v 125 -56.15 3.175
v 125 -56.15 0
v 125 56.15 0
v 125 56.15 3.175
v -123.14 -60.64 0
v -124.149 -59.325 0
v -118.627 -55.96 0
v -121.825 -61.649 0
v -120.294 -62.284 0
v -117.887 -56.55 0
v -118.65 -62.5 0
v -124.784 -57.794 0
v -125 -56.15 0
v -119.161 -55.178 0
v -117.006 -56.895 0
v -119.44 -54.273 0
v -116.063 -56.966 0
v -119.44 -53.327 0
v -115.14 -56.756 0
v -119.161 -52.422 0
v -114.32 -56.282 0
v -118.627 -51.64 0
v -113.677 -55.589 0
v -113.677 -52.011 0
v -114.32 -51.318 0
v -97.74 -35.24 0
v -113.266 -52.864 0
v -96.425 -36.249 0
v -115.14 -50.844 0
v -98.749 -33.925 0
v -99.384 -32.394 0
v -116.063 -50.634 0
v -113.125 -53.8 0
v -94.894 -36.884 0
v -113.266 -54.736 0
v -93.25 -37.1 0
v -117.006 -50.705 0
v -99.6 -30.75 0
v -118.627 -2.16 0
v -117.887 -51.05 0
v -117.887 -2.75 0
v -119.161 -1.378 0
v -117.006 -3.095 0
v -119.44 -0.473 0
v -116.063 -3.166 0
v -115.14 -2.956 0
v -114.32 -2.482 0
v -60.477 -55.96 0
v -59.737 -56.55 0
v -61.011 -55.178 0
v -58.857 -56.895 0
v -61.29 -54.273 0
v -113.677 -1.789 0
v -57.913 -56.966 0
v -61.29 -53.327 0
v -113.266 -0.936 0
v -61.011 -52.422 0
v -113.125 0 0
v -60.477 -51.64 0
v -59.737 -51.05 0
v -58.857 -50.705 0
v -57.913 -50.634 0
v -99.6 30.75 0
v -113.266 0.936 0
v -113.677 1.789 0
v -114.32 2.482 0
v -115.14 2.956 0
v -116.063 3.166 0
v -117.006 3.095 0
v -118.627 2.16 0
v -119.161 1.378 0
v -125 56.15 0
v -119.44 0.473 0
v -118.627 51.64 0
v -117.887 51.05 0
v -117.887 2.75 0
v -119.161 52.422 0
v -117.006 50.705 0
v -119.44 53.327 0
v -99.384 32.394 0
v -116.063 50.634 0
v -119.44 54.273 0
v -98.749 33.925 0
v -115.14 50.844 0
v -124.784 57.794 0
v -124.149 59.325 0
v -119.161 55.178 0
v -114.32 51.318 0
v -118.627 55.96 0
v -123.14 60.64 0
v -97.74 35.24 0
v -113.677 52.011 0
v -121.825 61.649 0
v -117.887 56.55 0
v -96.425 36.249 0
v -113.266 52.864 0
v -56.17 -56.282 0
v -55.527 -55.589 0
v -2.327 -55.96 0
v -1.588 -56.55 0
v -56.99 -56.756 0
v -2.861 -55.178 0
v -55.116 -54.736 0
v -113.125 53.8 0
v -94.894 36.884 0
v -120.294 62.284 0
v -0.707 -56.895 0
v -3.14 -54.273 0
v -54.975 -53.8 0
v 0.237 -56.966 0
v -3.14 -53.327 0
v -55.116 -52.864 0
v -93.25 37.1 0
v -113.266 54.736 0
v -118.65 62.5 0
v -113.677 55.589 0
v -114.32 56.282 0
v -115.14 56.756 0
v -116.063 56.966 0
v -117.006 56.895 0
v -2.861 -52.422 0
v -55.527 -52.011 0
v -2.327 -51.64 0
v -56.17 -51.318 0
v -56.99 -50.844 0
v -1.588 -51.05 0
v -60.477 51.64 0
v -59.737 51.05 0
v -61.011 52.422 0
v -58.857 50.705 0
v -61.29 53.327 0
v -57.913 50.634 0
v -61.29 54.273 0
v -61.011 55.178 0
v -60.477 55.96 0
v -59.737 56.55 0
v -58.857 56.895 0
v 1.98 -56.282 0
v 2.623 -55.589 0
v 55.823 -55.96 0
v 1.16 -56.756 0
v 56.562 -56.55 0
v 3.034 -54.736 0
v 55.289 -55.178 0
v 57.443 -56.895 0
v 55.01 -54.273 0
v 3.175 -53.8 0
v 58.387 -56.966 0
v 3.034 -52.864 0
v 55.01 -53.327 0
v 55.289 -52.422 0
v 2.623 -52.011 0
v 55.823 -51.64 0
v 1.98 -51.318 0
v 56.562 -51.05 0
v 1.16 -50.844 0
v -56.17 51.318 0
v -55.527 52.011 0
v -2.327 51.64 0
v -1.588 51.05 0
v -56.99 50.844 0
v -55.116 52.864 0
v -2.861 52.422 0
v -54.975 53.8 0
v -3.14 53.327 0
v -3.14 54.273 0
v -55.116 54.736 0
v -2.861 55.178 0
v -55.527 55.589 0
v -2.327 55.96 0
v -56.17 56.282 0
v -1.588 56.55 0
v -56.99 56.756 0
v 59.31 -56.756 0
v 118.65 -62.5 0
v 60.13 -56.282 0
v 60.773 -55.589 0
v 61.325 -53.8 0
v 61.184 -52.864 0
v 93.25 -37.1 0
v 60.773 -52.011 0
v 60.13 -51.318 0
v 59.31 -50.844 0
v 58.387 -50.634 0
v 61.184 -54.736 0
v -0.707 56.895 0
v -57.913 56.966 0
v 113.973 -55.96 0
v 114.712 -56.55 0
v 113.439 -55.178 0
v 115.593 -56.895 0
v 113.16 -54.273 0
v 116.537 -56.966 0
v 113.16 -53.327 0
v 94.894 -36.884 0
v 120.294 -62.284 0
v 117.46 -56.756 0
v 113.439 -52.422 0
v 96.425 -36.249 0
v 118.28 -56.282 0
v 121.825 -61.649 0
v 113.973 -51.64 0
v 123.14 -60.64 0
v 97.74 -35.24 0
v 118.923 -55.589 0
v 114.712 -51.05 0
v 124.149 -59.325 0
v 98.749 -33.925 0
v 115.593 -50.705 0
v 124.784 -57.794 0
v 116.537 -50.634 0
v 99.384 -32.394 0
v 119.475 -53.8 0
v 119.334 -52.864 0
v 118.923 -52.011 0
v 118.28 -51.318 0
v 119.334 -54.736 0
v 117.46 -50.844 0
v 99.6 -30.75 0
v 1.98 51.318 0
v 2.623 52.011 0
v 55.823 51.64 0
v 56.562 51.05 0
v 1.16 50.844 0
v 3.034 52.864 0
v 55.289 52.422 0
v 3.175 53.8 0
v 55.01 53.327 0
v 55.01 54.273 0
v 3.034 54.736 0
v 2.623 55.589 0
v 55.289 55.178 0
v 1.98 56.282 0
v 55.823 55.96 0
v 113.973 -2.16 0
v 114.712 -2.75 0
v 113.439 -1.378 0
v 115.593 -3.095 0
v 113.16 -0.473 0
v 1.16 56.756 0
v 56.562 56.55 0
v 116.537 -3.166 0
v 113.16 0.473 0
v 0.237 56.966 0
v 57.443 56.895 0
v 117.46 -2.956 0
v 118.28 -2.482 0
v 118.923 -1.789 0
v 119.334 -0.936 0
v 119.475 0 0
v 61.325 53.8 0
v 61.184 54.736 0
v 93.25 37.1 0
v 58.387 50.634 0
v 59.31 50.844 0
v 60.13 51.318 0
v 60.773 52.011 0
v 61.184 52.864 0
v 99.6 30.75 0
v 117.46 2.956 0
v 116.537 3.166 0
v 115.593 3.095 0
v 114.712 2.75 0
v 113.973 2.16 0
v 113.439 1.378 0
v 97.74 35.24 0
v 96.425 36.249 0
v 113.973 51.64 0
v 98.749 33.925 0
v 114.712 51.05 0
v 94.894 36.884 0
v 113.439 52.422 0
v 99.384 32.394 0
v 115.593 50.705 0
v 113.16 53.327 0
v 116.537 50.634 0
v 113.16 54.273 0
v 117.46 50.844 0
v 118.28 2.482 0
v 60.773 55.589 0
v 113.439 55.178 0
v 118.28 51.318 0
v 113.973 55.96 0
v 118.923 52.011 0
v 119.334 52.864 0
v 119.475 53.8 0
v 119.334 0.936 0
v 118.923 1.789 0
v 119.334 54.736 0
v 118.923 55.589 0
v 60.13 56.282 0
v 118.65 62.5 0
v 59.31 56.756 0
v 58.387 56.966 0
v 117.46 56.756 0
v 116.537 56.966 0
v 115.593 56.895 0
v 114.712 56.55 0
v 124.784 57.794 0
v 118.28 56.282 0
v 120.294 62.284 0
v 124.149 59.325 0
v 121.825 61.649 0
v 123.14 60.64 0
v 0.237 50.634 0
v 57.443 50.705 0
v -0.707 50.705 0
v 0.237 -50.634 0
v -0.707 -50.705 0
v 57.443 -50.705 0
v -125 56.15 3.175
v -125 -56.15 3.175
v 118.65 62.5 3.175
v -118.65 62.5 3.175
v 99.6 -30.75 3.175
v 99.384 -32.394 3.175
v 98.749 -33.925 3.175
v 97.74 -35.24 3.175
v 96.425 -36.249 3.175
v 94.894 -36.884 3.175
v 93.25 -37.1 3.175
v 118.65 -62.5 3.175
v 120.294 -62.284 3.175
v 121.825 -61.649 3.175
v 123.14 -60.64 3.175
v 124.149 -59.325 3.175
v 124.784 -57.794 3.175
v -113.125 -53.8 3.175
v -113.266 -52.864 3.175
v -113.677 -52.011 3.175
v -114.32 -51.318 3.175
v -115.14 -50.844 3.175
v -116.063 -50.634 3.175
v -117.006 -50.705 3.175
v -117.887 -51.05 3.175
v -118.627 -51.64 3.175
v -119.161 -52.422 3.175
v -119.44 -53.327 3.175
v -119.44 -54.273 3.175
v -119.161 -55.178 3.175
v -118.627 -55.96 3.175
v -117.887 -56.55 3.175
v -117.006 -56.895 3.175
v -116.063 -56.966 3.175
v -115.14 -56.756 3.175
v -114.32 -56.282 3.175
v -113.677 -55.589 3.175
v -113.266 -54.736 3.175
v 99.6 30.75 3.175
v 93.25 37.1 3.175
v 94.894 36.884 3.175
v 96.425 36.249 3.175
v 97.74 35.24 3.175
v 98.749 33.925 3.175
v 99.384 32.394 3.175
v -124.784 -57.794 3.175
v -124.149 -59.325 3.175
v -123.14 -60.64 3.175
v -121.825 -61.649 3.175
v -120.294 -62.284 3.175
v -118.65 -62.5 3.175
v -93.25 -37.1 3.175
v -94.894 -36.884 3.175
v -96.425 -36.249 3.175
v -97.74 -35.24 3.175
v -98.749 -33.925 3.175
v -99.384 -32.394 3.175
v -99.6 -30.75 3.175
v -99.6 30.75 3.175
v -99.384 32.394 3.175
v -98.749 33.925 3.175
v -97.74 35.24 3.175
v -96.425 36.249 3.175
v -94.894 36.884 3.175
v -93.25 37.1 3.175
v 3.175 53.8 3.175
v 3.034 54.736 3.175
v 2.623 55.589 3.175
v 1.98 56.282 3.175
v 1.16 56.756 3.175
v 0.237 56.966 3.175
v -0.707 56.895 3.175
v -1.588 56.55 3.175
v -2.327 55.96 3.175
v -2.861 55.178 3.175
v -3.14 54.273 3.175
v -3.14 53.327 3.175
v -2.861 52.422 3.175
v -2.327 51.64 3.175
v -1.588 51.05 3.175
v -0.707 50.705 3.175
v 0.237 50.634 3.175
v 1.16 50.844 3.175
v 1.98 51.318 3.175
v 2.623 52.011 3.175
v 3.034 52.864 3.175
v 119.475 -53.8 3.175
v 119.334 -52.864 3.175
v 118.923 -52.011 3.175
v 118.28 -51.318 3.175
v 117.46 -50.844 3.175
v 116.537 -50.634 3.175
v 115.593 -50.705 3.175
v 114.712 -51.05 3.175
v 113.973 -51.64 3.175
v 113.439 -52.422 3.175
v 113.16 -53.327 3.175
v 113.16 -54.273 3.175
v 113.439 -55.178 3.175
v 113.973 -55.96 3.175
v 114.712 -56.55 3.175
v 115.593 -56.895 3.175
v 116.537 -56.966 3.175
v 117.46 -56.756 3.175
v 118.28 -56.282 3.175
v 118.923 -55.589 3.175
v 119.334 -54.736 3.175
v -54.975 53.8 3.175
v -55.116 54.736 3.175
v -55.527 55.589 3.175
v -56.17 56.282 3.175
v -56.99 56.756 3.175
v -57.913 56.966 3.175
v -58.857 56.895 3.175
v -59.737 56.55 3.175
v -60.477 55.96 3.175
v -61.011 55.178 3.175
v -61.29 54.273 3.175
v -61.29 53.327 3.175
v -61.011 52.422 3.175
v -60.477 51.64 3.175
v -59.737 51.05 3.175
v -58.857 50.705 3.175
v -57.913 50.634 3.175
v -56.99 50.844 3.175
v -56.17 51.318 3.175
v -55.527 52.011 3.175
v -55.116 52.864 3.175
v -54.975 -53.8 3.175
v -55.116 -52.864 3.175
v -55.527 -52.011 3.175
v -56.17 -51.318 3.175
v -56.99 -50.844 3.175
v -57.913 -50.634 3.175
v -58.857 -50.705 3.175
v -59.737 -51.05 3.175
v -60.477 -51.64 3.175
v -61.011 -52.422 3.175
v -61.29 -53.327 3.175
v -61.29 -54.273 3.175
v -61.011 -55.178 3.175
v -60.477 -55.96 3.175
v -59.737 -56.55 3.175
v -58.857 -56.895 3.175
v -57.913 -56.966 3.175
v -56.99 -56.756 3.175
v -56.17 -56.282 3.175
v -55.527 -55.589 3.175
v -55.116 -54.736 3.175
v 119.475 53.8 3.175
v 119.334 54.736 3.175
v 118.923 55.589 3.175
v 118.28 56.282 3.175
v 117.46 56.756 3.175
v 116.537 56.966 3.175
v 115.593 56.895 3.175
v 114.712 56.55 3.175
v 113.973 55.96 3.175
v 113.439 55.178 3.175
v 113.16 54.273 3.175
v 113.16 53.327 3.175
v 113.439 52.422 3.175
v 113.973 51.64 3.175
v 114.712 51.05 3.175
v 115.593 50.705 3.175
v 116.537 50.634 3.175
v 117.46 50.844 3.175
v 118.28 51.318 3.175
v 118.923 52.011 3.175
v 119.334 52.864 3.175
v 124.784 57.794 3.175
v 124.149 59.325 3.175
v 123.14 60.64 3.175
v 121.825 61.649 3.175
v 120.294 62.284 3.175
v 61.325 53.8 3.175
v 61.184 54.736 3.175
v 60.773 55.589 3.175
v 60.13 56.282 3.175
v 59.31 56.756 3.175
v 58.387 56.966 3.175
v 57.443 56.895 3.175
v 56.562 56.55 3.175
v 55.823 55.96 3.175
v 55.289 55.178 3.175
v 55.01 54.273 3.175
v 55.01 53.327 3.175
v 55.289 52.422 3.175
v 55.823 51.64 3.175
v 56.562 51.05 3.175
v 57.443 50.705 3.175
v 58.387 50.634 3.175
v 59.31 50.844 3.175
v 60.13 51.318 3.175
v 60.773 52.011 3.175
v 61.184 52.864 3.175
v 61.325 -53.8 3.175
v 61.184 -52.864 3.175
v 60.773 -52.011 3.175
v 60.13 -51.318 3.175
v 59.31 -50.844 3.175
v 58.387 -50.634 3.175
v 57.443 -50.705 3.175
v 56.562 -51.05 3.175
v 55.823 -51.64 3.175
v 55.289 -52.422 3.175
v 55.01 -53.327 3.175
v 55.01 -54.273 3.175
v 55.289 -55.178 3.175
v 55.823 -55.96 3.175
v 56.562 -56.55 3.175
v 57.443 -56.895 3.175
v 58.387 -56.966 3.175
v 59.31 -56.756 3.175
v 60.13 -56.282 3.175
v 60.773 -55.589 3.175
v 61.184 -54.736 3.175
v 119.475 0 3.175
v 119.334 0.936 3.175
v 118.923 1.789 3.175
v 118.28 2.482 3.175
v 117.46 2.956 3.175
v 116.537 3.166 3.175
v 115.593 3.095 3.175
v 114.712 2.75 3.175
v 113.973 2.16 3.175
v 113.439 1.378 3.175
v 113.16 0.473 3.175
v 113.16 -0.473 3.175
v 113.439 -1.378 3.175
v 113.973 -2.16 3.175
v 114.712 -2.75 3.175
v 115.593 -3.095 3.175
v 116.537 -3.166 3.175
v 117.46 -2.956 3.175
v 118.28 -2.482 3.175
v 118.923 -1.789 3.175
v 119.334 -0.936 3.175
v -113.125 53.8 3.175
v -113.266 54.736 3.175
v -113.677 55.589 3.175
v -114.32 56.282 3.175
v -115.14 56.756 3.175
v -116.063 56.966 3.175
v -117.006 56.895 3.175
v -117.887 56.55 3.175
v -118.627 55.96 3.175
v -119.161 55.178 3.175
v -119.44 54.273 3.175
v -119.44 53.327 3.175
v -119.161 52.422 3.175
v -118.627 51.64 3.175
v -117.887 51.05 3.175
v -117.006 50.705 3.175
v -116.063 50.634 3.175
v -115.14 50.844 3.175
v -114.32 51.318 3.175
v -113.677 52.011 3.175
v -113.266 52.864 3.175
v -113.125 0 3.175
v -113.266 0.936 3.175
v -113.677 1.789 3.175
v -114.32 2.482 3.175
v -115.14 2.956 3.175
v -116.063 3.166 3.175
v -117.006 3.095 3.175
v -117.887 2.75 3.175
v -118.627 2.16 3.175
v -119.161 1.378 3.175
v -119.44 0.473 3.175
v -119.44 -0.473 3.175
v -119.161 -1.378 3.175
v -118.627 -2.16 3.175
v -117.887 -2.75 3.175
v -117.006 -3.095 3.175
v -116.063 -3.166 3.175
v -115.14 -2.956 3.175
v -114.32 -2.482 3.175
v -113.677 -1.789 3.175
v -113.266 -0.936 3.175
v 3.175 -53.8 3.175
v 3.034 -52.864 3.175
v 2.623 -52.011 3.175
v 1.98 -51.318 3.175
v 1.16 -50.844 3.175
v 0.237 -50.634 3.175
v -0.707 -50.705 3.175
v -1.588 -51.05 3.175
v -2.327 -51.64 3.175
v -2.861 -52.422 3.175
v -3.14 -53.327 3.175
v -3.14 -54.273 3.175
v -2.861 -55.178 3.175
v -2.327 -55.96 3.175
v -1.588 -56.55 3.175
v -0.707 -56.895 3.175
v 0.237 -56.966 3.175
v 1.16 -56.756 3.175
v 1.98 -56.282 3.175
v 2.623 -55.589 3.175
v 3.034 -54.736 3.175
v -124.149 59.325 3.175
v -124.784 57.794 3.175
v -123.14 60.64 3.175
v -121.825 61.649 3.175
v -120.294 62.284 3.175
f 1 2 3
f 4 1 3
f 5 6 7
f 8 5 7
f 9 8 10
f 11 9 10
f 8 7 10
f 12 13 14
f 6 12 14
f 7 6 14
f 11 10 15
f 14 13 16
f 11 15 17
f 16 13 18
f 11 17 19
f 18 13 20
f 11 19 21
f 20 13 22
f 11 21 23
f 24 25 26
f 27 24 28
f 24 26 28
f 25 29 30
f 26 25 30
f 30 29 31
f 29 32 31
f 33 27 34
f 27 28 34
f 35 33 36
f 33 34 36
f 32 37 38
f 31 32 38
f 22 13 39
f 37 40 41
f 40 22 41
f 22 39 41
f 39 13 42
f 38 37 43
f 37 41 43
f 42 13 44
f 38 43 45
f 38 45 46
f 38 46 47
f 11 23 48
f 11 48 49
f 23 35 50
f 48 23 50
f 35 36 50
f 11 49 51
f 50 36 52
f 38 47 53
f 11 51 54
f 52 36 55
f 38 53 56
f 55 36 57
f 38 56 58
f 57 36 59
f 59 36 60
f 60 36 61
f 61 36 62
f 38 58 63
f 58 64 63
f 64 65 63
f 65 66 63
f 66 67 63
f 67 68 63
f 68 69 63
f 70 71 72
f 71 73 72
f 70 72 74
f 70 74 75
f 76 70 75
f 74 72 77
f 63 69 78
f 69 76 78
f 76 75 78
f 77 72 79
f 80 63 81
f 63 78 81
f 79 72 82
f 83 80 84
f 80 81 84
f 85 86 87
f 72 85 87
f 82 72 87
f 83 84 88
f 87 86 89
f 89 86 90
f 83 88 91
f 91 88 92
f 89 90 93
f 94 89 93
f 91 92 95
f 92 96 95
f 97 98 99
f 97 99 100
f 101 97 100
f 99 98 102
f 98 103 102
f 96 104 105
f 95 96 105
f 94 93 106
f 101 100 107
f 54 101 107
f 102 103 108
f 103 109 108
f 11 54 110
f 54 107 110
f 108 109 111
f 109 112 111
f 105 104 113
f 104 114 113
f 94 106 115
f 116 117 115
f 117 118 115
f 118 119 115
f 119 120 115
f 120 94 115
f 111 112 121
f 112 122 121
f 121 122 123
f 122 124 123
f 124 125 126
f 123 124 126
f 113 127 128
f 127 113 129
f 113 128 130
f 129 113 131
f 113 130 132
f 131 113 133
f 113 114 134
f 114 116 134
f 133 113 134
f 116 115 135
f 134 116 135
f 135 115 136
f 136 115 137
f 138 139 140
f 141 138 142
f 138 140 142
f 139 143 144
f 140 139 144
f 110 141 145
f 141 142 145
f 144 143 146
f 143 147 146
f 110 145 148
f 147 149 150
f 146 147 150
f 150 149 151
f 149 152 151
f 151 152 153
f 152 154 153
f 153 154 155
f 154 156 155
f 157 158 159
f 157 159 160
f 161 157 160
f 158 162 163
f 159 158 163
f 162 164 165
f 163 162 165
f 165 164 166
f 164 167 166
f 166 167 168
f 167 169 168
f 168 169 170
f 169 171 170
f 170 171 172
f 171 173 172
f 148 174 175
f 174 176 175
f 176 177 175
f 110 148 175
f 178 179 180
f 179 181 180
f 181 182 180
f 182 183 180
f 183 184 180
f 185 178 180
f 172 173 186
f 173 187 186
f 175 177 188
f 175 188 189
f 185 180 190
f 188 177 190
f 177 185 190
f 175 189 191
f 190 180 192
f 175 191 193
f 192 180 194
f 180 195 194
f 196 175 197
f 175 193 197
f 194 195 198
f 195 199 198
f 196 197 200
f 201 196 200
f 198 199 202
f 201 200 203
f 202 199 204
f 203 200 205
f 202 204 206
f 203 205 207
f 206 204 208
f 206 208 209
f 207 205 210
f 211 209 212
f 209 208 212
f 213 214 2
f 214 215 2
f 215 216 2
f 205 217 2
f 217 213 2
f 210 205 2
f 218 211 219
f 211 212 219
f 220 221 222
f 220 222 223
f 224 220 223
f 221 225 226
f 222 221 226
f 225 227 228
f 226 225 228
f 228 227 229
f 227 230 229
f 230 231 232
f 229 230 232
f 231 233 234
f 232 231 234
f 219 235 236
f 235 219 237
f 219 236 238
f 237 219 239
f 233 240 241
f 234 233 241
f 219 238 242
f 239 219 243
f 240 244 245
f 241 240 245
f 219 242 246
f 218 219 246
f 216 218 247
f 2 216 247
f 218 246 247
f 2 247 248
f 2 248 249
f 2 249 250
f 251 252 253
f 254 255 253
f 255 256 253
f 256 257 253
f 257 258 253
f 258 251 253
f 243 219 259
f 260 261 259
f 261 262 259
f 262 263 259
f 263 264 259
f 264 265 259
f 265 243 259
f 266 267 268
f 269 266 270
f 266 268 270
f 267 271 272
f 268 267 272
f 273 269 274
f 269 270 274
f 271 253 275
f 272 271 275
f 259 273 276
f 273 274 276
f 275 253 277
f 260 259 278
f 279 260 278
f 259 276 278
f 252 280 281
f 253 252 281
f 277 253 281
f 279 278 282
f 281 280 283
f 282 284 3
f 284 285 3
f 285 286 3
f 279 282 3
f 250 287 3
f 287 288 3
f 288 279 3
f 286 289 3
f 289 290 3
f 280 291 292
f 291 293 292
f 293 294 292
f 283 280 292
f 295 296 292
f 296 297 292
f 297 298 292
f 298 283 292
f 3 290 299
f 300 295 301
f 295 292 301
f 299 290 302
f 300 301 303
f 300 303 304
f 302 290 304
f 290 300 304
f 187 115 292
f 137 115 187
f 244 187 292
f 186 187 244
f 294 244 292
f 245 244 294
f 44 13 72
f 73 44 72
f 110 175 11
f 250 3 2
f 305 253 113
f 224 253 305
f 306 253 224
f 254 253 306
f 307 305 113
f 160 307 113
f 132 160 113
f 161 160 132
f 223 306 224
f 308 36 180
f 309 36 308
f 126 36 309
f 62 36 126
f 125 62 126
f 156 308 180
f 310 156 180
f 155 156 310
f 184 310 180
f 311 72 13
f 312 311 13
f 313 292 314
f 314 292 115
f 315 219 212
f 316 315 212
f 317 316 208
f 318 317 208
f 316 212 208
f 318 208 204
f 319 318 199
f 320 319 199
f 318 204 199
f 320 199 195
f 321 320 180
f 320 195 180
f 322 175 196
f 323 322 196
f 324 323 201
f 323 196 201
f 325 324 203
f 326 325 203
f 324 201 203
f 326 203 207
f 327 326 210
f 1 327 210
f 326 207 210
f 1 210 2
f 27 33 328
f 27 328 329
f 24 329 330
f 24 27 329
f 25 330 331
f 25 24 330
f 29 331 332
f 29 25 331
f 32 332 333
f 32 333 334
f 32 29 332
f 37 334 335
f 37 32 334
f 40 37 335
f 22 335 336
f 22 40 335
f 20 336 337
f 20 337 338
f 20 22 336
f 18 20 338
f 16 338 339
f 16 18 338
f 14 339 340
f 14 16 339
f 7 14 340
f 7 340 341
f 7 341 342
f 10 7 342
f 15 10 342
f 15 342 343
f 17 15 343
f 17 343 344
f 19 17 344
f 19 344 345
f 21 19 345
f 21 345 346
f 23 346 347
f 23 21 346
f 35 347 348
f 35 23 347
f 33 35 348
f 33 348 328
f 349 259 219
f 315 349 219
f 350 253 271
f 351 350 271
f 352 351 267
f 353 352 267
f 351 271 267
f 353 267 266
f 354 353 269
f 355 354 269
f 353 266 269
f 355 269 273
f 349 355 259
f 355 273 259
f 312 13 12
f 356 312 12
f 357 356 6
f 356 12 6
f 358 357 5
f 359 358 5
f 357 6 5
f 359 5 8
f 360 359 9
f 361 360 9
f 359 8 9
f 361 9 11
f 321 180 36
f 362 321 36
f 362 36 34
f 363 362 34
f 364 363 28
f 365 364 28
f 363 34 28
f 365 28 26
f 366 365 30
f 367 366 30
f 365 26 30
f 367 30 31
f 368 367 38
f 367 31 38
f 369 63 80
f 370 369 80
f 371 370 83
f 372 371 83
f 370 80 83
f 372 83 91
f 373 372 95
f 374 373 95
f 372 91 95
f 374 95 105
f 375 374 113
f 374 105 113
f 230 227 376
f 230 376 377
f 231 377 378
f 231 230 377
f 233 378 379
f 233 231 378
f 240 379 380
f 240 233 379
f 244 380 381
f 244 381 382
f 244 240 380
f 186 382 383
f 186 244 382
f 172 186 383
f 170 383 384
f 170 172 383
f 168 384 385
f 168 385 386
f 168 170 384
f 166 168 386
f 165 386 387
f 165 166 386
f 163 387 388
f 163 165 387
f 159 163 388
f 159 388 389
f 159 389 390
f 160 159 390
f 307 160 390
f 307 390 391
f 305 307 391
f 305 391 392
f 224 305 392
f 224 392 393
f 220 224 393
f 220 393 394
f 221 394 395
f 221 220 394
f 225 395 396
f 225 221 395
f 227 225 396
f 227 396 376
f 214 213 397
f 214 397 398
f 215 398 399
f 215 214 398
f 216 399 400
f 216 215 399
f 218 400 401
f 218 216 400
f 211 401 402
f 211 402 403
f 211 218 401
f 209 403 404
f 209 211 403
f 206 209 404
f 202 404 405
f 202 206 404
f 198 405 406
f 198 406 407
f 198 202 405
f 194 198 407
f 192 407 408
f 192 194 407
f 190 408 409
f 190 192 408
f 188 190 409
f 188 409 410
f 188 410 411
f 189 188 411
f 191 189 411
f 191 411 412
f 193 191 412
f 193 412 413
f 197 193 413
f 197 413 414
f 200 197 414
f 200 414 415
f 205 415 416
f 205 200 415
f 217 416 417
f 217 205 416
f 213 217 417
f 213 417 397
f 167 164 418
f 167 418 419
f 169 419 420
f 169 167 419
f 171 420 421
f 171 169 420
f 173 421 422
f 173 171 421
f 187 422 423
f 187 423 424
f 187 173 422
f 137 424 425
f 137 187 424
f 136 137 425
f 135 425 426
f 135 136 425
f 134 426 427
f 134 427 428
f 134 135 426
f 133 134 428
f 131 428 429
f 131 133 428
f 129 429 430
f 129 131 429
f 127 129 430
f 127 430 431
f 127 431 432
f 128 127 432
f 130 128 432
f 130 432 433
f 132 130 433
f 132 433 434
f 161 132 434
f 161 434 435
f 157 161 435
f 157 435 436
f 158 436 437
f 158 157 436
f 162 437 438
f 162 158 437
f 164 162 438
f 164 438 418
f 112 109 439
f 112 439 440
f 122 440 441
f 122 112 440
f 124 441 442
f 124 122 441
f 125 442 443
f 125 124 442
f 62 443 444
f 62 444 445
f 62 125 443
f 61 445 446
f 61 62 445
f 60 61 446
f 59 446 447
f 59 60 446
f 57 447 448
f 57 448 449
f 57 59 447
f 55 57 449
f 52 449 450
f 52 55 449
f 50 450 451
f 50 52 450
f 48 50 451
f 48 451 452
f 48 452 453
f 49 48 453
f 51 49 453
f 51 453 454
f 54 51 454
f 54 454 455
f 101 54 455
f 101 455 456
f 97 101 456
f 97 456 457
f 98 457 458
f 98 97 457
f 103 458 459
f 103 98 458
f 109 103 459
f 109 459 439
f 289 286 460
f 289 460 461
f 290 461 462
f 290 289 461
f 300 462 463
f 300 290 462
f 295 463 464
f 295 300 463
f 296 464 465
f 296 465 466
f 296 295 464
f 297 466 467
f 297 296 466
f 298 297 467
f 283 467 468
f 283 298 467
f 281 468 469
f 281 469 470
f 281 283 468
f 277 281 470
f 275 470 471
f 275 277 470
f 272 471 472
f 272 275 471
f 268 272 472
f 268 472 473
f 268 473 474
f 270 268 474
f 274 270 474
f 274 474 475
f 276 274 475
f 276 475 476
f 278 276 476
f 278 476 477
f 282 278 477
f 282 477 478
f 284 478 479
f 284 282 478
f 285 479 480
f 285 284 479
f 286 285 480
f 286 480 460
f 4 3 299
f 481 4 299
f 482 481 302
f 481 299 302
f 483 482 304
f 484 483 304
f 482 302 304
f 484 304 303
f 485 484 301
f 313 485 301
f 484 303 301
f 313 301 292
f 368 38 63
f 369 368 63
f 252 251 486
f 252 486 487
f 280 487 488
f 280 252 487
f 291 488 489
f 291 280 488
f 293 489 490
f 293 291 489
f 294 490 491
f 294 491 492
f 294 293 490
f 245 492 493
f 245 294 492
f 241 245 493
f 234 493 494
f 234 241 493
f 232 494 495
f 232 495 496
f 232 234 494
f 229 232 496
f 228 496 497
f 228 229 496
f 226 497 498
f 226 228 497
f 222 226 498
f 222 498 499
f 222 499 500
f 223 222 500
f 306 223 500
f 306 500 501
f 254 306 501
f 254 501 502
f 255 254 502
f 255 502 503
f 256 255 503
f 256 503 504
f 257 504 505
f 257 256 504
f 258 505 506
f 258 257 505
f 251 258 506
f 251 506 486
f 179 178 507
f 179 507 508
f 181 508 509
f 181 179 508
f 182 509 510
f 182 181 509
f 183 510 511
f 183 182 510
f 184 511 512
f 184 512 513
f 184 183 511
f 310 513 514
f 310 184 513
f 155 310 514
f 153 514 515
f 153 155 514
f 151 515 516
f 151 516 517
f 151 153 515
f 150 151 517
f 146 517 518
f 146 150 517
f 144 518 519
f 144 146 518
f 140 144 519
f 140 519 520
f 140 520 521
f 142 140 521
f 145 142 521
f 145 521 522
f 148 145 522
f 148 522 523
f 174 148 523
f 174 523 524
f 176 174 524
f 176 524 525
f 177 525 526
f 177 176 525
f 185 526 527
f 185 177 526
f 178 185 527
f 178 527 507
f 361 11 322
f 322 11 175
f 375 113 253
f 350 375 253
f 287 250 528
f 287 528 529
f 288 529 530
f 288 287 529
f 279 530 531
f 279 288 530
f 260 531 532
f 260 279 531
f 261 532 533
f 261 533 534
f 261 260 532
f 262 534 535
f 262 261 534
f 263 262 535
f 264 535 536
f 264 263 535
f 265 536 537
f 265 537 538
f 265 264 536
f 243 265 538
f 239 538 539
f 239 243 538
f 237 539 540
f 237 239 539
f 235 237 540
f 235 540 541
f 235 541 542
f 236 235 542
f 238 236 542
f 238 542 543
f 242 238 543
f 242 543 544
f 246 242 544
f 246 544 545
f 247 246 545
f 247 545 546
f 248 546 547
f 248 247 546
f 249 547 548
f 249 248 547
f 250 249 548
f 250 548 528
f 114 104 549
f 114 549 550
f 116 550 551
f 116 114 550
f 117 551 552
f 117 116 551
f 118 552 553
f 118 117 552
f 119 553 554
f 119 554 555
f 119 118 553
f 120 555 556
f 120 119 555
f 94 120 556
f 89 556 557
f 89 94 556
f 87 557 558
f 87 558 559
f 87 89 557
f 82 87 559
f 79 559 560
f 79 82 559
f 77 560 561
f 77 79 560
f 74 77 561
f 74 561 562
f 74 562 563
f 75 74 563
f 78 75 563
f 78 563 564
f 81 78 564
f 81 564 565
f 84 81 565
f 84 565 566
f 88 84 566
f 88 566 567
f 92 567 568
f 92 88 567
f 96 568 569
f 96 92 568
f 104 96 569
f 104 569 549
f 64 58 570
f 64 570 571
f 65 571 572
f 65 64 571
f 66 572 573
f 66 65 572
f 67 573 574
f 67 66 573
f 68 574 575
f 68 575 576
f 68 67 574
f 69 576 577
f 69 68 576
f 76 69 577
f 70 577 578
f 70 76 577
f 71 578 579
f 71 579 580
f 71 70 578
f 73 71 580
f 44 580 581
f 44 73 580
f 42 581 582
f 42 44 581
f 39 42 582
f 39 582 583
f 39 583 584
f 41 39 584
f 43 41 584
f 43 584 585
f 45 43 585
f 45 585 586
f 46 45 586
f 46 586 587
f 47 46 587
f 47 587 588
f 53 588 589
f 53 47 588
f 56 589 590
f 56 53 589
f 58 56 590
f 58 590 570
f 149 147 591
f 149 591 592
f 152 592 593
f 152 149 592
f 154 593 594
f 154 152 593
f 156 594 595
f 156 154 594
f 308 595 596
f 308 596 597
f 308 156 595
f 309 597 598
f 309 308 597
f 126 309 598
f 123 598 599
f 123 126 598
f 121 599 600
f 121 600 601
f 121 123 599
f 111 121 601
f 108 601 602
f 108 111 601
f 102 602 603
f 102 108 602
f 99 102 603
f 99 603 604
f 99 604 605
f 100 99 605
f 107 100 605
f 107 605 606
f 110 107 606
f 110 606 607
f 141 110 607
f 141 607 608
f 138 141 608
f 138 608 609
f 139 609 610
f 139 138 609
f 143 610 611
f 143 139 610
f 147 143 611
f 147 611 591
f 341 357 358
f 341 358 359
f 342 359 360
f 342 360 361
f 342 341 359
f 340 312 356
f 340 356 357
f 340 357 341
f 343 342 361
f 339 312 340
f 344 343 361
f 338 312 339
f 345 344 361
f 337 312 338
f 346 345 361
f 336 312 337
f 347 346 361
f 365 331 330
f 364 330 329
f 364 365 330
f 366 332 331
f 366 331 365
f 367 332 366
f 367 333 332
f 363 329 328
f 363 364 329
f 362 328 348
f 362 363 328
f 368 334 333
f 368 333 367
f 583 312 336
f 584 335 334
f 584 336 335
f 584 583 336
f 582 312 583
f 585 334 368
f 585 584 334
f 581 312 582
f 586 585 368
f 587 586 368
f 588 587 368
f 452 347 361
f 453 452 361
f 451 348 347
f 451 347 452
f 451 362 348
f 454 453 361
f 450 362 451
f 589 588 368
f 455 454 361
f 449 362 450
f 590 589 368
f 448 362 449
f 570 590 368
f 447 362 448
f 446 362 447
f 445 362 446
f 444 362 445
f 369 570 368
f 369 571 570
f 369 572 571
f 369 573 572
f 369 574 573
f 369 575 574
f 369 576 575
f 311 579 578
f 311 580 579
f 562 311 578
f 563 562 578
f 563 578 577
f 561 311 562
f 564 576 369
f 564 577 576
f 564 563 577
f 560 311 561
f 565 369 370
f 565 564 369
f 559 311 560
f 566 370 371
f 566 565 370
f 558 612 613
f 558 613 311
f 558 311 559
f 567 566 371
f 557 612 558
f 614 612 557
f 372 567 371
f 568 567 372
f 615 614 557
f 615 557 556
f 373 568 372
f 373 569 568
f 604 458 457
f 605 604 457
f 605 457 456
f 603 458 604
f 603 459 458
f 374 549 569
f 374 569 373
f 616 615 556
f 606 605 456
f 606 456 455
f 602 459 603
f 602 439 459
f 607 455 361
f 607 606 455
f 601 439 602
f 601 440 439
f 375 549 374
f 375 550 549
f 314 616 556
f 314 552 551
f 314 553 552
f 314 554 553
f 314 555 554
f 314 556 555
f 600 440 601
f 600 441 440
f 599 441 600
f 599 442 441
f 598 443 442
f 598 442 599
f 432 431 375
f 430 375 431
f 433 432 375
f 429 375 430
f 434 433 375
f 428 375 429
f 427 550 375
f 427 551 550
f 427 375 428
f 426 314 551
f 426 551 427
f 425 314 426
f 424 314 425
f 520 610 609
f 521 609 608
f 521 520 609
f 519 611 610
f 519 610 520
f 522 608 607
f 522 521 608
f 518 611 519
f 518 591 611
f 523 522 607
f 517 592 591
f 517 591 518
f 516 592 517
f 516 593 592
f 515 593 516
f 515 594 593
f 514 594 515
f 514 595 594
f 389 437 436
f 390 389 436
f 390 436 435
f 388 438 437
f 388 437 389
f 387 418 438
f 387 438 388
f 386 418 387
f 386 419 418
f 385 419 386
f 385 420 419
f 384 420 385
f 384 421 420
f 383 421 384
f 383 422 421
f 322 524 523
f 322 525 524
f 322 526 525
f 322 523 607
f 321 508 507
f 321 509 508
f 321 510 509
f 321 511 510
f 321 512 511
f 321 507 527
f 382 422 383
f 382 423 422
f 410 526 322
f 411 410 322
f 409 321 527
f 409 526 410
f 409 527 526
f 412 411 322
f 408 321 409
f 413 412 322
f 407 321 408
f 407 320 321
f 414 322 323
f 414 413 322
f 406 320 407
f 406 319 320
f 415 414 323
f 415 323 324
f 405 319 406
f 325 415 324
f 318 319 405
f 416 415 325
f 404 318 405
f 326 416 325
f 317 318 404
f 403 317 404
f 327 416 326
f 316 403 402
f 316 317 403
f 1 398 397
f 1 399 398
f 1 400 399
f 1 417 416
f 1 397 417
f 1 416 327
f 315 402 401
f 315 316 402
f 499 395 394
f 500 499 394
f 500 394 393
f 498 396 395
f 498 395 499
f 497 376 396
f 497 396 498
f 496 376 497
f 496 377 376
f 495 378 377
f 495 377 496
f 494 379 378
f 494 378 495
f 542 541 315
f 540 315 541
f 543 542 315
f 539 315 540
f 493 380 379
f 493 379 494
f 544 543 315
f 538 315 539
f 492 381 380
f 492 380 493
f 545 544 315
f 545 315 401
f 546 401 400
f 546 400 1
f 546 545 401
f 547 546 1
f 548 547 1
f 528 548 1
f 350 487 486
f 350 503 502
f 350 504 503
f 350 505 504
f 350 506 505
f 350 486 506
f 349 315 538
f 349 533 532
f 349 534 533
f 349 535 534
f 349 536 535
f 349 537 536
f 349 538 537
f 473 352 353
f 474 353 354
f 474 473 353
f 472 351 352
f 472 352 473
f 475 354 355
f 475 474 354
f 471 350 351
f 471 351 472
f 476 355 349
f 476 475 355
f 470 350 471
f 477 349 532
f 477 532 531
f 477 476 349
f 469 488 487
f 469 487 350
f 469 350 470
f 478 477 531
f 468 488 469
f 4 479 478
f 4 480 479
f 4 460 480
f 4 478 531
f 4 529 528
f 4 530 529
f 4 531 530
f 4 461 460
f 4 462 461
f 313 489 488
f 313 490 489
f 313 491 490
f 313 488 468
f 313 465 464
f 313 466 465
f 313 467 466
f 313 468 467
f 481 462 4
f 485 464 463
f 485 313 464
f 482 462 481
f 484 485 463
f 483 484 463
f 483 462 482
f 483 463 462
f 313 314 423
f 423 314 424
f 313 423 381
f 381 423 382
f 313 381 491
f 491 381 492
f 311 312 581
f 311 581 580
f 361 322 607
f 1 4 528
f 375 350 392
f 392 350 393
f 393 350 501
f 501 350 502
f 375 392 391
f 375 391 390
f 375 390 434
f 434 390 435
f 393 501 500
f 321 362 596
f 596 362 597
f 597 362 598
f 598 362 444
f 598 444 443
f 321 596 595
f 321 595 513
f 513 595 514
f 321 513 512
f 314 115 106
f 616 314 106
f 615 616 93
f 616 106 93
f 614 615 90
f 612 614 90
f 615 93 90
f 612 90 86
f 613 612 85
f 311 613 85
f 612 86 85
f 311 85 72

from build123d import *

# Parameters (mm, degrees)
F0_R     = 3.175
F1_DEPTH = 3.175


with BuildPart() as f1:
    # F0 (on Top) → F1 (new body)
    with BuildSketch(Plane.XY):
        with BuildLine():
            Line((118.650004, 62.500002), (-118.650004, 62.500002))
            ThreePointArc((-118.650004, 62.500002), (-123.140132, 60.64013), (-125.000004, 56.150002))
            Line((-125.000004, 56.150002), (-125.000004, -56.150002))
            ThreePointArc((-125.000004, -56.150002), (-123.140132, -60.64013), (-118.650004, -62.500002))
            Line((-118.650004, -62.500002), (118.650004, -62.500002))
            ThreePointArc((118.650004, -62.500002), (123.140132, -60.64013), (125.000004, -56.150002))
            Line((125.000004, -56.150002), (125.000004, 56.150002))
            ThreePointArc((125.000004, 56.150002), (123.140132, 60.64013), (118.650004, 62.500002))
        make_face()
        with Locations((-116.299996, -53.79999)):
            Circle(F0_R, mode=Mode.SUBTRACT)
        with Locations((-58.149998, -53.79999)):
            Circle(F0_R, mode=Mode.SUBTRACT)
        with Locations((-116.299996, -4e-06)):
            Circle(F0_R, mode=Mode.SUBTRACT)
        with Locations((0, -53.79999)):
            Circle(F0_R, mode=Mode.SUBTRACT)
        with Locations((58.149998, -53.79999)):
            Circle(F0_R, mode=Mode.SUBTRACT)
        with Locations((116.299996, -53.79999)):
            Circle(F0_R, mode=Mode.SUBTRACT)
        with Locations((116.299996, -4e-06)):
            Circle(F0_R, mode=Mode.SUBTRACT)
        with Locations((-116.299996, 53.79999)):
            Circle(F0_R, mode=Mode.SUBTRACT)
        with Locations((-58.149998, 53.79999)):
            Circle(F0_R, mode=Mode.SUBTRACT)
        with BuildLine():
            ThreePointArc((-99.600004, 30.750002), (-97.740132, 35.24013), (-93.250004, 37.100002))
            Line((-93.250004, 37.100002), (93.250004, 37.100002))
            ThreePointArc((93.250004, 37.100002), (97.740132, 35.24013), (99.600004, 30.750002))
            Line((99.600004, 30.750002), (99.600004, -30.750002))
            ThreePointArc((99.600004, -30.750002), (97.740132, -35.24013), (93.250004, -37.100002))
            Line((93.250004, -37.100002), (-93.250004, -37.100002))
            ThreePointArc((-93.250004, -37.100002), (-97.740132, -35.24013), (-99.600004, -30.750002))
            Line((-99.600004, -30.750002), (-99.600004, 30.750002))
        make_face(mode=Mode.SUBTRACT)
        with Locations((0, 53.79999)):
            Circle(F0_R, mode=Mode.SUBTRACT)
        with Locations((58.149998, 53.79999)):
            Circle(F0_R, mode=Mode.SUBTRACT)
        with Locations((116.299996, 53.79999)):
            Circle(F0_R, mode=Mode.SUBTRACT)
    extrude(amount=F1_DEPTH)


solid = f1.part
